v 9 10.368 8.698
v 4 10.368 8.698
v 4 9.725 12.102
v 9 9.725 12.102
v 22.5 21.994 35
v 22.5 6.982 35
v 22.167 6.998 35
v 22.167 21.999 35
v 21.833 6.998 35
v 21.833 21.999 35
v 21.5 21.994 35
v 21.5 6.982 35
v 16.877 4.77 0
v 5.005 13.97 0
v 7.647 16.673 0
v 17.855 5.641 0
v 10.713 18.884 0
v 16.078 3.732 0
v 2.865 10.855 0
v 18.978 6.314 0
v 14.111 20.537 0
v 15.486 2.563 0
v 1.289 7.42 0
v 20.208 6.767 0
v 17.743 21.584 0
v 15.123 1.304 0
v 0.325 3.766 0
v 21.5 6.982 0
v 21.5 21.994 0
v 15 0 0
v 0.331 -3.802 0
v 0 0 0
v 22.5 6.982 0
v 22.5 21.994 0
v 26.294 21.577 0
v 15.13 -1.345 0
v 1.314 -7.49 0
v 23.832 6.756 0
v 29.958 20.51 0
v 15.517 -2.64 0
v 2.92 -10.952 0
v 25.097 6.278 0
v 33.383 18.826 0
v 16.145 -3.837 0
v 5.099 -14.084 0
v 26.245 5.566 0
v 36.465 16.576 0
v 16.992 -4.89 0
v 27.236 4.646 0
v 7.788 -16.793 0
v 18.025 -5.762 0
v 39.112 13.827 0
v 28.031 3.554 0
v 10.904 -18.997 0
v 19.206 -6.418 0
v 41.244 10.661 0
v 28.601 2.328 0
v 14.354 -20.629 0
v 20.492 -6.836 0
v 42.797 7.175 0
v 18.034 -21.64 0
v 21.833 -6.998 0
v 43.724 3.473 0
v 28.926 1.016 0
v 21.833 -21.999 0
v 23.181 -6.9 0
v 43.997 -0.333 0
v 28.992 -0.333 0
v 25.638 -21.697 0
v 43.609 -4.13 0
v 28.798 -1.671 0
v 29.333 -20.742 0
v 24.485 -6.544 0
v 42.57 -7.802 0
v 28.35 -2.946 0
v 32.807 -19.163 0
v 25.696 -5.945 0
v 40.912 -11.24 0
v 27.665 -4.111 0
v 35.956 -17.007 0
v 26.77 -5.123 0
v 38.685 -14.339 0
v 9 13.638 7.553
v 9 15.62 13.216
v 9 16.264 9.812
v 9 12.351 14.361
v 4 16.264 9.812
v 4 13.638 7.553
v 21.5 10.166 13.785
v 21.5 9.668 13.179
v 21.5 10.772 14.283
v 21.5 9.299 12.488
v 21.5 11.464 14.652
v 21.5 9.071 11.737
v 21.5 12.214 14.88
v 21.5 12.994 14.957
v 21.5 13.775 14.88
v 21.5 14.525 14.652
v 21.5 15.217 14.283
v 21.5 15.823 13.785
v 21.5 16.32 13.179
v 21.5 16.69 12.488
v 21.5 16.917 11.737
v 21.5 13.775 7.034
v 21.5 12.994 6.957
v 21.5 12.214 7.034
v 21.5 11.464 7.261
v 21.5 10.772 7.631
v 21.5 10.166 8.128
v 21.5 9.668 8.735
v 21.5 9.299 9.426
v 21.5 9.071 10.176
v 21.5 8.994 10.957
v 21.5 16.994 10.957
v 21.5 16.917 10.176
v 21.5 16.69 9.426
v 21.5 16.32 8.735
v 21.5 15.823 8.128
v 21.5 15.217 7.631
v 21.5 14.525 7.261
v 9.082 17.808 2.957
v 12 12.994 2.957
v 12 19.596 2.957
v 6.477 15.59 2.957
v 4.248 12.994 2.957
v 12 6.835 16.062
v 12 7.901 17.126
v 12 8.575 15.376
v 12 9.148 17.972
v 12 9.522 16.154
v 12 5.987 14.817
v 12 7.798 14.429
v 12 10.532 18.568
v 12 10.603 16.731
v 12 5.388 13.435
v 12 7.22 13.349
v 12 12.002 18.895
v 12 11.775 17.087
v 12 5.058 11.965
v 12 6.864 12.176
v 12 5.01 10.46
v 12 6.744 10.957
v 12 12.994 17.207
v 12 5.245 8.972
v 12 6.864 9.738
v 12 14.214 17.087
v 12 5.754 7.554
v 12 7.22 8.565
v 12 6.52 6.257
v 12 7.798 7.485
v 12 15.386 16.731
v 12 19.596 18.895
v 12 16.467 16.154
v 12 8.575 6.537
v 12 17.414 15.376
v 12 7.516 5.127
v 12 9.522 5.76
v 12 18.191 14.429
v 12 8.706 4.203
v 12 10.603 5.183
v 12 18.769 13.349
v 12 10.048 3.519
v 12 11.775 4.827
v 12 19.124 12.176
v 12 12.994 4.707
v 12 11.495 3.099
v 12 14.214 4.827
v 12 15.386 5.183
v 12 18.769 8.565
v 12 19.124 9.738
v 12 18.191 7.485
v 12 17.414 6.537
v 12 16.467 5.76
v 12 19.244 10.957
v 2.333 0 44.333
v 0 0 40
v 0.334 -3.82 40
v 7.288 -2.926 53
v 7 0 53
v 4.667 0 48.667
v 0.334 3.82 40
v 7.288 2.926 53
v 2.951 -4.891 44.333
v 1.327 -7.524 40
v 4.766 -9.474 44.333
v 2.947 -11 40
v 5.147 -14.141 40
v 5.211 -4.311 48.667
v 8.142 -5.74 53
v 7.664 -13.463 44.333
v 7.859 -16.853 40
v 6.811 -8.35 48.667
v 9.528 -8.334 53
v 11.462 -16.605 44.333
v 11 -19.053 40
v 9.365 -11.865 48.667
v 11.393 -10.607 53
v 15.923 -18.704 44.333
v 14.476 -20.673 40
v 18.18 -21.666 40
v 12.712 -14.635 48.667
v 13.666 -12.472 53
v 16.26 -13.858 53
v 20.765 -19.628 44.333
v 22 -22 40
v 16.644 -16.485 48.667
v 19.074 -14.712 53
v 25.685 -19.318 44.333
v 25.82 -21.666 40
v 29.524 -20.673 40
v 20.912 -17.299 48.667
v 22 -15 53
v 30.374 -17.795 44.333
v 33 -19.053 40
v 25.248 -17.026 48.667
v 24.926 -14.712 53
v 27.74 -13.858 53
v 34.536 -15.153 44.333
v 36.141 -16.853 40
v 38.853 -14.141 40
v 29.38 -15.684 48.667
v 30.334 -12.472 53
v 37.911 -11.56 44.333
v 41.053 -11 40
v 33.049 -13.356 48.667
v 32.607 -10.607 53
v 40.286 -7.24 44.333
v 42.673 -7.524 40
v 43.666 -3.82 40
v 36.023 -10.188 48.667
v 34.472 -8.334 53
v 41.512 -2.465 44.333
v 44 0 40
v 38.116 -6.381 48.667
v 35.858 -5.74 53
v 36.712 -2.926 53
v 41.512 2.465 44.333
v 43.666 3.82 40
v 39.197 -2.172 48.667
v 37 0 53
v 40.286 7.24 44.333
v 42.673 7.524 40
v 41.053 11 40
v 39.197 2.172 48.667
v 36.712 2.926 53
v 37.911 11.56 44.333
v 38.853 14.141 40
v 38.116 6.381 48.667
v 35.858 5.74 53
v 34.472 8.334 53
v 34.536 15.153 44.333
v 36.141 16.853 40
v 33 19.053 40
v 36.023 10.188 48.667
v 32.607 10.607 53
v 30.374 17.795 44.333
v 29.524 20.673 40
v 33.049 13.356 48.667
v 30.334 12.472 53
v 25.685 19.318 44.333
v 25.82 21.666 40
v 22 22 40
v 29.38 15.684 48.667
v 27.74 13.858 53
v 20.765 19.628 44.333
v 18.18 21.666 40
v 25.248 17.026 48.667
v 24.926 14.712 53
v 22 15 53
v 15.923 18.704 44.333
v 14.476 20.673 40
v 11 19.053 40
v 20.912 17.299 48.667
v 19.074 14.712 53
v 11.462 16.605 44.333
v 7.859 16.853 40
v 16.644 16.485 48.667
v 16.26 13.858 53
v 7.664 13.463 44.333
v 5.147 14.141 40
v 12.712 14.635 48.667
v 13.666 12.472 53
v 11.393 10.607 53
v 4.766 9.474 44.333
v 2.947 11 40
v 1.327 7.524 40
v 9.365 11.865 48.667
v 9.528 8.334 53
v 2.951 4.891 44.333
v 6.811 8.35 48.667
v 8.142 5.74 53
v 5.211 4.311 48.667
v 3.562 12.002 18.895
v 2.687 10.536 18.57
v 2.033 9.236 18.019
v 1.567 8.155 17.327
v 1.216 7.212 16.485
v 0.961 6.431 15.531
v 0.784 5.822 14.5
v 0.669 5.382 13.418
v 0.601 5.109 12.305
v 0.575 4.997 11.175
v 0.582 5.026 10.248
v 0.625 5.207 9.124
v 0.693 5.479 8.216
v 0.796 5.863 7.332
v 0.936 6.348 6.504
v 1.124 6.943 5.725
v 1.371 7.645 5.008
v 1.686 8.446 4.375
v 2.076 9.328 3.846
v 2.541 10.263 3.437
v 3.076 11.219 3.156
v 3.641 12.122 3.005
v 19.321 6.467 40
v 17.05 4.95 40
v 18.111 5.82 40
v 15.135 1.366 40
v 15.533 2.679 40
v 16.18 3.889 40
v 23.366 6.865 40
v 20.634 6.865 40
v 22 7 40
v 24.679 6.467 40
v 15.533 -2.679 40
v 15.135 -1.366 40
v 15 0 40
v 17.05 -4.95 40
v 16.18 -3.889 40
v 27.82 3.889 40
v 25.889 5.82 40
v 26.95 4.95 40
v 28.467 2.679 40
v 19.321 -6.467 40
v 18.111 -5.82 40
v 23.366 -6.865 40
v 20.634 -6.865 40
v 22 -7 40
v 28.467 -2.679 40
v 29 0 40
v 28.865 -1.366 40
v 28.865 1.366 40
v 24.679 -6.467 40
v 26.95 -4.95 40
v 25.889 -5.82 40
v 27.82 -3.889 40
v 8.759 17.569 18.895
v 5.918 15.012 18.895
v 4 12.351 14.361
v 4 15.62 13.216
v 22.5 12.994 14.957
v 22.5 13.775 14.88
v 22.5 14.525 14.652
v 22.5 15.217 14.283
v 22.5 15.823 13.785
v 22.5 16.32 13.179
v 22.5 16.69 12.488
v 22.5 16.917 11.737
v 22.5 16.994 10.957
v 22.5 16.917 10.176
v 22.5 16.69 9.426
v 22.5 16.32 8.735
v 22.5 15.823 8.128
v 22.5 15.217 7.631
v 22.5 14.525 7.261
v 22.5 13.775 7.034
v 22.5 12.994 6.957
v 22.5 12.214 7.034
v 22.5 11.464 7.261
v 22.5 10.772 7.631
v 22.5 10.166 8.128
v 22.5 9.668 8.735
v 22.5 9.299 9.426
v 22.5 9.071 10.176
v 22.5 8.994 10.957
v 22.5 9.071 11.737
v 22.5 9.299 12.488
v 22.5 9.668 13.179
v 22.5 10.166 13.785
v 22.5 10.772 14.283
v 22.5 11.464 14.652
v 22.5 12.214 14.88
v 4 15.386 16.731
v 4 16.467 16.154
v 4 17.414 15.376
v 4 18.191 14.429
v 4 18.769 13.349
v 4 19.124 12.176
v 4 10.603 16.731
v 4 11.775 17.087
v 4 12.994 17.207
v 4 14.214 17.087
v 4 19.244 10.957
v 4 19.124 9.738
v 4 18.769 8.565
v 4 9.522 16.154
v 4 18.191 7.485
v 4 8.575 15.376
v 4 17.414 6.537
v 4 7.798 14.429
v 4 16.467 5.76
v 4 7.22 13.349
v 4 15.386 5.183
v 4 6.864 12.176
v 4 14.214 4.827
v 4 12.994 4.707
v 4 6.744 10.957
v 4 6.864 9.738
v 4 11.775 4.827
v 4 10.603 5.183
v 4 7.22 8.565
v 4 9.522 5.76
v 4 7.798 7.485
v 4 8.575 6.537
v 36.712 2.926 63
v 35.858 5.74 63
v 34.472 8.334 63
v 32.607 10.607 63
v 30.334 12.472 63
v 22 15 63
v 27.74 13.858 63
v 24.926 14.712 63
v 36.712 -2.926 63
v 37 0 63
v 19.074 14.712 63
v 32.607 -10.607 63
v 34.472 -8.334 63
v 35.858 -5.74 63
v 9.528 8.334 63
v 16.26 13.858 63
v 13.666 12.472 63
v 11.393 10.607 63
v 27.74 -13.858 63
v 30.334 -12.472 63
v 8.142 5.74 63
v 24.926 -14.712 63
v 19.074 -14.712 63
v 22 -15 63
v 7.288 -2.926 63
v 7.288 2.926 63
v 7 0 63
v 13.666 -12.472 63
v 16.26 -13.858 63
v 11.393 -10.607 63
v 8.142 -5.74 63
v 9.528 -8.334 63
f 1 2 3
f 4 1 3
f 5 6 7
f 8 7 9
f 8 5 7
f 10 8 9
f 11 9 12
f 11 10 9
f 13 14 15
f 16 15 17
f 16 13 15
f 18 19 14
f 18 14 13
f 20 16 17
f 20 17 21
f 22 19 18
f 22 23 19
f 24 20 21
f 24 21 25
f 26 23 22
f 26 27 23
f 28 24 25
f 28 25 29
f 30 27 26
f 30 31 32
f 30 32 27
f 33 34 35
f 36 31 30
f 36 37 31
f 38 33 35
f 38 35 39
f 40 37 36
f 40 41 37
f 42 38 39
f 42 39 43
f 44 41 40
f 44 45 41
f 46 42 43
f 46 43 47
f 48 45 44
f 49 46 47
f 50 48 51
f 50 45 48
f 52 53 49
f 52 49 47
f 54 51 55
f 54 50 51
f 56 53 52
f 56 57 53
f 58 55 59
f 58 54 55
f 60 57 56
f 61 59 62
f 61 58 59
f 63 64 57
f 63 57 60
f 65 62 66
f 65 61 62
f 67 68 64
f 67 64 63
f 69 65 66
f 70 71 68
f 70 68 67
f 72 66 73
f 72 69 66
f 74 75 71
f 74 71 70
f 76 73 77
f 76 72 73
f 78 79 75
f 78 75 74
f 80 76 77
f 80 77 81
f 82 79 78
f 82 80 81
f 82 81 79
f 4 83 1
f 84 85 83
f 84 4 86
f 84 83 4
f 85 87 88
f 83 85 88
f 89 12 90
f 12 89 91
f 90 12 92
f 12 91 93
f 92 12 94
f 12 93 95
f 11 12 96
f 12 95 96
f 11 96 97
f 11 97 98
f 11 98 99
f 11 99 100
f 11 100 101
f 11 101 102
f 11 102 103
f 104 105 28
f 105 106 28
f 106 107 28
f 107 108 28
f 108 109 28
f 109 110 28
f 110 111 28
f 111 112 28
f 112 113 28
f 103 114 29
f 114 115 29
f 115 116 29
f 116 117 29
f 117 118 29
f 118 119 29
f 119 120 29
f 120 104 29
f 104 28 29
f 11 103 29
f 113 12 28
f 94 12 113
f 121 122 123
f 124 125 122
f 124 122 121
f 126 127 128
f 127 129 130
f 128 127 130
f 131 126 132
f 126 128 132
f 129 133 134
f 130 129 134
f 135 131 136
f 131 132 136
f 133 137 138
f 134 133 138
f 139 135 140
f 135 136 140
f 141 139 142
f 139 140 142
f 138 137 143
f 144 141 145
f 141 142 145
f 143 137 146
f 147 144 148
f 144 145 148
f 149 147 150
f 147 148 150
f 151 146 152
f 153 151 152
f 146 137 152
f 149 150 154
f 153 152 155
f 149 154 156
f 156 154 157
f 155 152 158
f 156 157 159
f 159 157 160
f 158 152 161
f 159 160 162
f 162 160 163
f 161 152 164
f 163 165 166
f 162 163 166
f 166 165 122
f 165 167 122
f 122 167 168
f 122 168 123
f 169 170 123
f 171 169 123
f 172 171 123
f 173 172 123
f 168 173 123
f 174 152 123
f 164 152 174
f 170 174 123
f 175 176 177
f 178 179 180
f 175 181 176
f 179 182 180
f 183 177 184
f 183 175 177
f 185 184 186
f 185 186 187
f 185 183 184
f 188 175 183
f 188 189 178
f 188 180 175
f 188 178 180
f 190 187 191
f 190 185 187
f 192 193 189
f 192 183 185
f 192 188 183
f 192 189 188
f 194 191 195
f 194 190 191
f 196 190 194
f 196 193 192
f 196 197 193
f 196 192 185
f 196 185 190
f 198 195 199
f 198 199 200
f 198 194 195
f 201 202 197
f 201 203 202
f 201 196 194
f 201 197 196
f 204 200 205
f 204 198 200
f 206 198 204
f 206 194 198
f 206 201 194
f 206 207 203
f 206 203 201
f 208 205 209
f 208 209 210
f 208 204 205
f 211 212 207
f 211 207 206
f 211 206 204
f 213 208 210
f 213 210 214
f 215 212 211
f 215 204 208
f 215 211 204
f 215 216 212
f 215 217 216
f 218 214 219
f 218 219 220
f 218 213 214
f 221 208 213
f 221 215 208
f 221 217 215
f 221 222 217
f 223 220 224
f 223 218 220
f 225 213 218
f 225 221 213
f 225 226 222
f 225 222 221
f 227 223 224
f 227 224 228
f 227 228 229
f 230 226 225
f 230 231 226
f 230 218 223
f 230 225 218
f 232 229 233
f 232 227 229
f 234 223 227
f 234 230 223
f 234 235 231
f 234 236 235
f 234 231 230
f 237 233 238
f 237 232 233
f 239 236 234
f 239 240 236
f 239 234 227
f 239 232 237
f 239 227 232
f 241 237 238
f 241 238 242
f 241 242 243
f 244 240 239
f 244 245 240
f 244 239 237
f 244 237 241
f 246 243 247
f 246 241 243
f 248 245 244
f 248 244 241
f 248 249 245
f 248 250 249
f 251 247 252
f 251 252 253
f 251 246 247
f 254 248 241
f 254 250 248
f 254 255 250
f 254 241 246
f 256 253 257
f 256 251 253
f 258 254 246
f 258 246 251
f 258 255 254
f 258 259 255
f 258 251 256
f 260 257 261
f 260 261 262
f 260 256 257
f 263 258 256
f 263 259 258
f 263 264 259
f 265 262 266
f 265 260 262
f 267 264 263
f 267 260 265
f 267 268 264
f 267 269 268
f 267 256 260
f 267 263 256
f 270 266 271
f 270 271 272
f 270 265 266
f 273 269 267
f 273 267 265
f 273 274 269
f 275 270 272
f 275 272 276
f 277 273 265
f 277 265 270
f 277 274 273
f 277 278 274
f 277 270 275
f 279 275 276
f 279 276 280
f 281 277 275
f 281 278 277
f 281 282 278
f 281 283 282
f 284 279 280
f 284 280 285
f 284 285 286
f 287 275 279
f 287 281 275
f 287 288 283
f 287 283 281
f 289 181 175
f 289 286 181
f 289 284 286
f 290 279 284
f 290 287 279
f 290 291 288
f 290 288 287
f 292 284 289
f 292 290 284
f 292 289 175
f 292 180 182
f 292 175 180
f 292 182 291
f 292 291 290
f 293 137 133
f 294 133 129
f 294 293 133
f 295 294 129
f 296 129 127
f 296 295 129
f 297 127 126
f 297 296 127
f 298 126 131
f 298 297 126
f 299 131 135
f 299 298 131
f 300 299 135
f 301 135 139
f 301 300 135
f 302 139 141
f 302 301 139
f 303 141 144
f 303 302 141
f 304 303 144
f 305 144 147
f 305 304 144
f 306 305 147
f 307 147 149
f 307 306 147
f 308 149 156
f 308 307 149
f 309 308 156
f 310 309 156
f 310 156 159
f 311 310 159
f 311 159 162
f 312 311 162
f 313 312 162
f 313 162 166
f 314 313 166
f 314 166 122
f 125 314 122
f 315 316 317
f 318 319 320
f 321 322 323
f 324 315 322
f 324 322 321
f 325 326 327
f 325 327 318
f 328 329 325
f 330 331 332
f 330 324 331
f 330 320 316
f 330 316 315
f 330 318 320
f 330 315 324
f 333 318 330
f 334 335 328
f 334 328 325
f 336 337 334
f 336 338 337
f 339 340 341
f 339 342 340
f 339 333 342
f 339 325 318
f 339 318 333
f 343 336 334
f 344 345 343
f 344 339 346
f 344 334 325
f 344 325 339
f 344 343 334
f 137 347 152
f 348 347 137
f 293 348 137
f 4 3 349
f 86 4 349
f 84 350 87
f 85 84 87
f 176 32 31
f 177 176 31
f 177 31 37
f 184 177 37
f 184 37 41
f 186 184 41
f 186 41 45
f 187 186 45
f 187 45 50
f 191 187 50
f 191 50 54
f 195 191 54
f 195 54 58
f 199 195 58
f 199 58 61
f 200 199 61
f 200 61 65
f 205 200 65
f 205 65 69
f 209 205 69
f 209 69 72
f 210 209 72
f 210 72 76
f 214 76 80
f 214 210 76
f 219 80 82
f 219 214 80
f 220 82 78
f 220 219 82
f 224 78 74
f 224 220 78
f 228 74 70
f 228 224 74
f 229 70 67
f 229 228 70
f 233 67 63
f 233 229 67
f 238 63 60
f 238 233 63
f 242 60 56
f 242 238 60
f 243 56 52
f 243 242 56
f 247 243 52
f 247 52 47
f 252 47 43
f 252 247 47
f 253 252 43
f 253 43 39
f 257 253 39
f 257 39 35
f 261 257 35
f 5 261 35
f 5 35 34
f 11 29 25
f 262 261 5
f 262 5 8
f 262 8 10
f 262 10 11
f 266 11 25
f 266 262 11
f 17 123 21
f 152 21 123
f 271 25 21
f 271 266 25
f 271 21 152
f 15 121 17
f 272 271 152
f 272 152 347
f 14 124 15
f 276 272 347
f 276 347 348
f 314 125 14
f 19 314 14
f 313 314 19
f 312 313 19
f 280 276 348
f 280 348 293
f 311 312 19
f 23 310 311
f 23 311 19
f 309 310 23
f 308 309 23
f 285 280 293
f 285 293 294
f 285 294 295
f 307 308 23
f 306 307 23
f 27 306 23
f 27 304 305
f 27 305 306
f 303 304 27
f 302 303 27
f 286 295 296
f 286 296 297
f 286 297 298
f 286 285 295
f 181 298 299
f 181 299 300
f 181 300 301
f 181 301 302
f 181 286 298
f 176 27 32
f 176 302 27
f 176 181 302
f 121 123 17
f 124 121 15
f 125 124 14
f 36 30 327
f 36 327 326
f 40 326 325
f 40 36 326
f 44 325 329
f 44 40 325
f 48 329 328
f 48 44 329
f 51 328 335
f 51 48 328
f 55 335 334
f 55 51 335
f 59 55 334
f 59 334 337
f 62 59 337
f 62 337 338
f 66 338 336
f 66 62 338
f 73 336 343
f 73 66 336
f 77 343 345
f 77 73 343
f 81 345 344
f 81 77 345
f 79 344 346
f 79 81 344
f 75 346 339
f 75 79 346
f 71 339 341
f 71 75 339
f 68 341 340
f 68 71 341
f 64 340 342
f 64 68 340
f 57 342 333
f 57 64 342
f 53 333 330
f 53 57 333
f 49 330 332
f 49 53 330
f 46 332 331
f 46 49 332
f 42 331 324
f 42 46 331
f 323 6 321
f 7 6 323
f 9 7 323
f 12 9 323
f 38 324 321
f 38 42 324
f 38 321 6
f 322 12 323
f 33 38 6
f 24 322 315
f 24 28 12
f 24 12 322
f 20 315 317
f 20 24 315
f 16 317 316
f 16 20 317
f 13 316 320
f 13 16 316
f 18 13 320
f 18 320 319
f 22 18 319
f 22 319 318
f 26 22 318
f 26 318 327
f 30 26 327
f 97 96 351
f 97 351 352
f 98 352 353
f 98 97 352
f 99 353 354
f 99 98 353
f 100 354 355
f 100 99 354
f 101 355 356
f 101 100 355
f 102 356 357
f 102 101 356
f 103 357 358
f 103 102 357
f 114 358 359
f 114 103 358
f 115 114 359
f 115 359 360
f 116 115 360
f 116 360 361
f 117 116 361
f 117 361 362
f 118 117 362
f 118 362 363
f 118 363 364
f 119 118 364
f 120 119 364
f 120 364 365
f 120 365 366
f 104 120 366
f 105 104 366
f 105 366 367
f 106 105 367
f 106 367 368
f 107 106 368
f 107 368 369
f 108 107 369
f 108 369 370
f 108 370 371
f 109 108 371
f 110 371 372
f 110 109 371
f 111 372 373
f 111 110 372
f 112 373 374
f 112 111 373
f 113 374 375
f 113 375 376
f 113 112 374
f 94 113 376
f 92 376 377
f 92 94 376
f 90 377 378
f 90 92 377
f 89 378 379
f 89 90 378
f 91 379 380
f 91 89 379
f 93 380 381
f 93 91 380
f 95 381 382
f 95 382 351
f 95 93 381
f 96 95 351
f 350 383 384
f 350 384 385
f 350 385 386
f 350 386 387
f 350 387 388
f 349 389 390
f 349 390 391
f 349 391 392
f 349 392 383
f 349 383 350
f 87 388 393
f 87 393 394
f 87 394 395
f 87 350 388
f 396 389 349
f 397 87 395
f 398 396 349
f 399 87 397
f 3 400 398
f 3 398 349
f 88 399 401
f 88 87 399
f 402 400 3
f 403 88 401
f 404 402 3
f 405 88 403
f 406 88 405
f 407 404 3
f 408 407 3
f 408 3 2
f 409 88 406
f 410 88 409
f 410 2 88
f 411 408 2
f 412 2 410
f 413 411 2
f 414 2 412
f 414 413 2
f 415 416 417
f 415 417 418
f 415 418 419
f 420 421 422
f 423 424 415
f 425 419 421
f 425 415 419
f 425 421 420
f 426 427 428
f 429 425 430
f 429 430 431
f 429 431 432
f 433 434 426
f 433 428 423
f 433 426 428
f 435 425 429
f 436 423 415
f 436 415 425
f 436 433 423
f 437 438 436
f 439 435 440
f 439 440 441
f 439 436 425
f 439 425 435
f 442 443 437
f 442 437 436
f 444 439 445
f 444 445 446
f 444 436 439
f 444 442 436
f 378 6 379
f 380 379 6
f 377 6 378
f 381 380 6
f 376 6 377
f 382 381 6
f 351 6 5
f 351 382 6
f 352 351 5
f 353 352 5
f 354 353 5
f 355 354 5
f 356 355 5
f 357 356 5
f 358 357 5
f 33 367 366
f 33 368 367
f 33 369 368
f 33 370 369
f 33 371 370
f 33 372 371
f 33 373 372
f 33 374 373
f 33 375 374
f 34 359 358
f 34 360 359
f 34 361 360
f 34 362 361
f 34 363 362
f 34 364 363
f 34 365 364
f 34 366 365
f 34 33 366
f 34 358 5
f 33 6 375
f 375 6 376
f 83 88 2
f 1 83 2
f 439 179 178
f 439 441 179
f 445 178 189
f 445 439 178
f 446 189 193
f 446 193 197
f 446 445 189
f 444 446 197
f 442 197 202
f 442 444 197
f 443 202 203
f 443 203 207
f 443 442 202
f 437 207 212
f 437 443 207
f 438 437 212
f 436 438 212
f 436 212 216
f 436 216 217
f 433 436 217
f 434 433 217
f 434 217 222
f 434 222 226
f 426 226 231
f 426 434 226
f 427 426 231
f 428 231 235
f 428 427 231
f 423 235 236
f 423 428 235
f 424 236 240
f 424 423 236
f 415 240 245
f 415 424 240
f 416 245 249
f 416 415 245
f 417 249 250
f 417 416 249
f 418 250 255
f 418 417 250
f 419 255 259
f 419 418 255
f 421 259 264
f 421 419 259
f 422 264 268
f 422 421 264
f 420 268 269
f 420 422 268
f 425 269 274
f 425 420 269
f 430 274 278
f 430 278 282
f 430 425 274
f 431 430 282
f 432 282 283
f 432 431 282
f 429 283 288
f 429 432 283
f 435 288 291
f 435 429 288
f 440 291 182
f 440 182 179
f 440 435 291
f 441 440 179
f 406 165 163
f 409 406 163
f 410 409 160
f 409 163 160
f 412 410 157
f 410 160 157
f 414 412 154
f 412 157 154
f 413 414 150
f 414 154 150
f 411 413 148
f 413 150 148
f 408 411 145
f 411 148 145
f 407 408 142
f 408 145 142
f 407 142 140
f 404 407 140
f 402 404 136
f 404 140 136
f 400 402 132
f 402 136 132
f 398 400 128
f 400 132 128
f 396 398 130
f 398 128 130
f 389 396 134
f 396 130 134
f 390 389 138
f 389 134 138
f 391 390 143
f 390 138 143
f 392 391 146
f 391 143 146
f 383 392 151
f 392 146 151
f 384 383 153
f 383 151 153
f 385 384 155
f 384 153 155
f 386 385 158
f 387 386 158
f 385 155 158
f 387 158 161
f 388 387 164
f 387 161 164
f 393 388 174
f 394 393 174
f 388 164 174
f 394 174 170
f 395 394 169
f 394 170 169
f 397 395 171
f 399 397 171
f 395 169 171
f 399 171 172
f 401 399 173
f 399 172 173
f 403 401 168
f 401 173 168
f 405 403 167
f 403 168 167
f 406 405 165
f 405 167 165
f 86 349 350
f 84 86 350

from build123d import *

# Parameters (mm, degrees)
SZKIC3_W                    = 1
SZKIC3_H                    = 17.528511895
WYTNIJ_WYCI_GNI_CIE1_DEPTH  = 35
WYTNIJ_WYCI_GNI_CIE4_DEPTH  = 12
SZKIC10_R                   = 6.25
DODANIE_WYCI_GNI_CIE5_DEPTH = 8
WYTNIJ_WYCI_GNI_CIE5_DEPTH  = 5
SZKIC12_R                   = 4
DODANIE_WYCI_GNI_CIE6_DEPTH = 23


with BuildPart() as part:
    # Szkic2 → Obrót1 (revolve)
    with BuildSketch(Plane(origin=(0, 0, 0), x_dir=(1, 0, 0), z_dir=(0, 1, 0))):
        Polygon((0, 0), (0, -40), (7, -53), (7, -63), (22, -63), (22, -40), (15, -40), (15, 0), align=None)
    revolve(axis=Axis((22, 0, 0), (0, 0, 1)))

    # Szkic3 → Wytnij-wyciągnięcie1 (cut)
    with BuildSketch(Plane(origin=(0, 0, 0), x_dir=(-1, 0, 0), z_dir=(0, 0, -1))):
        with Locations((-22, 13.789096025)):
            Rectangle(SZKIC3_W, SZKIC3_H)
    extrude(amount=-WYTNIJ_WYCI_GNI_CIE1_DEPTH, mode=Mode.SUBTRACT)

    # Szkic9 → Wytnij-wyciągnięcie4 (cut)
    with BuildSketch(Plane(origin=(0, 0, 0), x_dir=(0, 0, -1), z_dir=(1, 0, 0))):
        with BuildLine():
            Line((-2.956841624, 12.994317448), (-2.956841624, 31.011341841))
            Line((-2.956841624, 31.011341841), (-18.895064638, 31.011341841))
            Line((-18.895064638, 31.011341841), (-18.895064638, 12.002039571))
            ThreePointArc((-18.895064638, 12.002039571), (-10.459742092, 5.009776631), (-2.956841624, 12.994317448))
        make_face()
    extrude(amount=WYTNIJ_WYCI_GNI_CIE4_DEPTH, mode=Mode.SUBTRACT)

    # Szkic10 → Dodanie-wyciągnięcie5 (add)
    with BuildSketch(Plane.ZY.offset(-12)):
        with Locations(Location((10.956841624, 12.994317448, 0), (0, 0, 180))):
            Circle(SZKIC10_R)
    extrude(amount=DODANIE_WYCI_GNI_CIE5_DEPTH)

    # Szkic11 → Wytnij-wyciągnięcie5 (cut)
    with BuildSketch(Plane.ZY.offset(-4)):
        Polygon((14.360666712, 12.350908736), (13.215962457, 15.620412088), (9.812137369, 16.2638208), (7.553016536, 13.63772616), (8.697720791, 10.368222807), (12.101545879, 9.724814096), align=None)
    extrude(amount=-WYTNIJ_WYCI_GNI_CIE5_DEPTH, mode=Mode.SUBTRACT)

    # Szkic12 → Dodanie-wyciągnięcie6 (add)
    with BuildSketch(Plane.ZY.offset(-9)):
        with Locations((10.956841624, 12.994317448)):
            Circle(SZKIC12_R)
    extrude(amount=-DODANIE_WYCI_GNI_CIE6_DEPTH)


solid = part.part
